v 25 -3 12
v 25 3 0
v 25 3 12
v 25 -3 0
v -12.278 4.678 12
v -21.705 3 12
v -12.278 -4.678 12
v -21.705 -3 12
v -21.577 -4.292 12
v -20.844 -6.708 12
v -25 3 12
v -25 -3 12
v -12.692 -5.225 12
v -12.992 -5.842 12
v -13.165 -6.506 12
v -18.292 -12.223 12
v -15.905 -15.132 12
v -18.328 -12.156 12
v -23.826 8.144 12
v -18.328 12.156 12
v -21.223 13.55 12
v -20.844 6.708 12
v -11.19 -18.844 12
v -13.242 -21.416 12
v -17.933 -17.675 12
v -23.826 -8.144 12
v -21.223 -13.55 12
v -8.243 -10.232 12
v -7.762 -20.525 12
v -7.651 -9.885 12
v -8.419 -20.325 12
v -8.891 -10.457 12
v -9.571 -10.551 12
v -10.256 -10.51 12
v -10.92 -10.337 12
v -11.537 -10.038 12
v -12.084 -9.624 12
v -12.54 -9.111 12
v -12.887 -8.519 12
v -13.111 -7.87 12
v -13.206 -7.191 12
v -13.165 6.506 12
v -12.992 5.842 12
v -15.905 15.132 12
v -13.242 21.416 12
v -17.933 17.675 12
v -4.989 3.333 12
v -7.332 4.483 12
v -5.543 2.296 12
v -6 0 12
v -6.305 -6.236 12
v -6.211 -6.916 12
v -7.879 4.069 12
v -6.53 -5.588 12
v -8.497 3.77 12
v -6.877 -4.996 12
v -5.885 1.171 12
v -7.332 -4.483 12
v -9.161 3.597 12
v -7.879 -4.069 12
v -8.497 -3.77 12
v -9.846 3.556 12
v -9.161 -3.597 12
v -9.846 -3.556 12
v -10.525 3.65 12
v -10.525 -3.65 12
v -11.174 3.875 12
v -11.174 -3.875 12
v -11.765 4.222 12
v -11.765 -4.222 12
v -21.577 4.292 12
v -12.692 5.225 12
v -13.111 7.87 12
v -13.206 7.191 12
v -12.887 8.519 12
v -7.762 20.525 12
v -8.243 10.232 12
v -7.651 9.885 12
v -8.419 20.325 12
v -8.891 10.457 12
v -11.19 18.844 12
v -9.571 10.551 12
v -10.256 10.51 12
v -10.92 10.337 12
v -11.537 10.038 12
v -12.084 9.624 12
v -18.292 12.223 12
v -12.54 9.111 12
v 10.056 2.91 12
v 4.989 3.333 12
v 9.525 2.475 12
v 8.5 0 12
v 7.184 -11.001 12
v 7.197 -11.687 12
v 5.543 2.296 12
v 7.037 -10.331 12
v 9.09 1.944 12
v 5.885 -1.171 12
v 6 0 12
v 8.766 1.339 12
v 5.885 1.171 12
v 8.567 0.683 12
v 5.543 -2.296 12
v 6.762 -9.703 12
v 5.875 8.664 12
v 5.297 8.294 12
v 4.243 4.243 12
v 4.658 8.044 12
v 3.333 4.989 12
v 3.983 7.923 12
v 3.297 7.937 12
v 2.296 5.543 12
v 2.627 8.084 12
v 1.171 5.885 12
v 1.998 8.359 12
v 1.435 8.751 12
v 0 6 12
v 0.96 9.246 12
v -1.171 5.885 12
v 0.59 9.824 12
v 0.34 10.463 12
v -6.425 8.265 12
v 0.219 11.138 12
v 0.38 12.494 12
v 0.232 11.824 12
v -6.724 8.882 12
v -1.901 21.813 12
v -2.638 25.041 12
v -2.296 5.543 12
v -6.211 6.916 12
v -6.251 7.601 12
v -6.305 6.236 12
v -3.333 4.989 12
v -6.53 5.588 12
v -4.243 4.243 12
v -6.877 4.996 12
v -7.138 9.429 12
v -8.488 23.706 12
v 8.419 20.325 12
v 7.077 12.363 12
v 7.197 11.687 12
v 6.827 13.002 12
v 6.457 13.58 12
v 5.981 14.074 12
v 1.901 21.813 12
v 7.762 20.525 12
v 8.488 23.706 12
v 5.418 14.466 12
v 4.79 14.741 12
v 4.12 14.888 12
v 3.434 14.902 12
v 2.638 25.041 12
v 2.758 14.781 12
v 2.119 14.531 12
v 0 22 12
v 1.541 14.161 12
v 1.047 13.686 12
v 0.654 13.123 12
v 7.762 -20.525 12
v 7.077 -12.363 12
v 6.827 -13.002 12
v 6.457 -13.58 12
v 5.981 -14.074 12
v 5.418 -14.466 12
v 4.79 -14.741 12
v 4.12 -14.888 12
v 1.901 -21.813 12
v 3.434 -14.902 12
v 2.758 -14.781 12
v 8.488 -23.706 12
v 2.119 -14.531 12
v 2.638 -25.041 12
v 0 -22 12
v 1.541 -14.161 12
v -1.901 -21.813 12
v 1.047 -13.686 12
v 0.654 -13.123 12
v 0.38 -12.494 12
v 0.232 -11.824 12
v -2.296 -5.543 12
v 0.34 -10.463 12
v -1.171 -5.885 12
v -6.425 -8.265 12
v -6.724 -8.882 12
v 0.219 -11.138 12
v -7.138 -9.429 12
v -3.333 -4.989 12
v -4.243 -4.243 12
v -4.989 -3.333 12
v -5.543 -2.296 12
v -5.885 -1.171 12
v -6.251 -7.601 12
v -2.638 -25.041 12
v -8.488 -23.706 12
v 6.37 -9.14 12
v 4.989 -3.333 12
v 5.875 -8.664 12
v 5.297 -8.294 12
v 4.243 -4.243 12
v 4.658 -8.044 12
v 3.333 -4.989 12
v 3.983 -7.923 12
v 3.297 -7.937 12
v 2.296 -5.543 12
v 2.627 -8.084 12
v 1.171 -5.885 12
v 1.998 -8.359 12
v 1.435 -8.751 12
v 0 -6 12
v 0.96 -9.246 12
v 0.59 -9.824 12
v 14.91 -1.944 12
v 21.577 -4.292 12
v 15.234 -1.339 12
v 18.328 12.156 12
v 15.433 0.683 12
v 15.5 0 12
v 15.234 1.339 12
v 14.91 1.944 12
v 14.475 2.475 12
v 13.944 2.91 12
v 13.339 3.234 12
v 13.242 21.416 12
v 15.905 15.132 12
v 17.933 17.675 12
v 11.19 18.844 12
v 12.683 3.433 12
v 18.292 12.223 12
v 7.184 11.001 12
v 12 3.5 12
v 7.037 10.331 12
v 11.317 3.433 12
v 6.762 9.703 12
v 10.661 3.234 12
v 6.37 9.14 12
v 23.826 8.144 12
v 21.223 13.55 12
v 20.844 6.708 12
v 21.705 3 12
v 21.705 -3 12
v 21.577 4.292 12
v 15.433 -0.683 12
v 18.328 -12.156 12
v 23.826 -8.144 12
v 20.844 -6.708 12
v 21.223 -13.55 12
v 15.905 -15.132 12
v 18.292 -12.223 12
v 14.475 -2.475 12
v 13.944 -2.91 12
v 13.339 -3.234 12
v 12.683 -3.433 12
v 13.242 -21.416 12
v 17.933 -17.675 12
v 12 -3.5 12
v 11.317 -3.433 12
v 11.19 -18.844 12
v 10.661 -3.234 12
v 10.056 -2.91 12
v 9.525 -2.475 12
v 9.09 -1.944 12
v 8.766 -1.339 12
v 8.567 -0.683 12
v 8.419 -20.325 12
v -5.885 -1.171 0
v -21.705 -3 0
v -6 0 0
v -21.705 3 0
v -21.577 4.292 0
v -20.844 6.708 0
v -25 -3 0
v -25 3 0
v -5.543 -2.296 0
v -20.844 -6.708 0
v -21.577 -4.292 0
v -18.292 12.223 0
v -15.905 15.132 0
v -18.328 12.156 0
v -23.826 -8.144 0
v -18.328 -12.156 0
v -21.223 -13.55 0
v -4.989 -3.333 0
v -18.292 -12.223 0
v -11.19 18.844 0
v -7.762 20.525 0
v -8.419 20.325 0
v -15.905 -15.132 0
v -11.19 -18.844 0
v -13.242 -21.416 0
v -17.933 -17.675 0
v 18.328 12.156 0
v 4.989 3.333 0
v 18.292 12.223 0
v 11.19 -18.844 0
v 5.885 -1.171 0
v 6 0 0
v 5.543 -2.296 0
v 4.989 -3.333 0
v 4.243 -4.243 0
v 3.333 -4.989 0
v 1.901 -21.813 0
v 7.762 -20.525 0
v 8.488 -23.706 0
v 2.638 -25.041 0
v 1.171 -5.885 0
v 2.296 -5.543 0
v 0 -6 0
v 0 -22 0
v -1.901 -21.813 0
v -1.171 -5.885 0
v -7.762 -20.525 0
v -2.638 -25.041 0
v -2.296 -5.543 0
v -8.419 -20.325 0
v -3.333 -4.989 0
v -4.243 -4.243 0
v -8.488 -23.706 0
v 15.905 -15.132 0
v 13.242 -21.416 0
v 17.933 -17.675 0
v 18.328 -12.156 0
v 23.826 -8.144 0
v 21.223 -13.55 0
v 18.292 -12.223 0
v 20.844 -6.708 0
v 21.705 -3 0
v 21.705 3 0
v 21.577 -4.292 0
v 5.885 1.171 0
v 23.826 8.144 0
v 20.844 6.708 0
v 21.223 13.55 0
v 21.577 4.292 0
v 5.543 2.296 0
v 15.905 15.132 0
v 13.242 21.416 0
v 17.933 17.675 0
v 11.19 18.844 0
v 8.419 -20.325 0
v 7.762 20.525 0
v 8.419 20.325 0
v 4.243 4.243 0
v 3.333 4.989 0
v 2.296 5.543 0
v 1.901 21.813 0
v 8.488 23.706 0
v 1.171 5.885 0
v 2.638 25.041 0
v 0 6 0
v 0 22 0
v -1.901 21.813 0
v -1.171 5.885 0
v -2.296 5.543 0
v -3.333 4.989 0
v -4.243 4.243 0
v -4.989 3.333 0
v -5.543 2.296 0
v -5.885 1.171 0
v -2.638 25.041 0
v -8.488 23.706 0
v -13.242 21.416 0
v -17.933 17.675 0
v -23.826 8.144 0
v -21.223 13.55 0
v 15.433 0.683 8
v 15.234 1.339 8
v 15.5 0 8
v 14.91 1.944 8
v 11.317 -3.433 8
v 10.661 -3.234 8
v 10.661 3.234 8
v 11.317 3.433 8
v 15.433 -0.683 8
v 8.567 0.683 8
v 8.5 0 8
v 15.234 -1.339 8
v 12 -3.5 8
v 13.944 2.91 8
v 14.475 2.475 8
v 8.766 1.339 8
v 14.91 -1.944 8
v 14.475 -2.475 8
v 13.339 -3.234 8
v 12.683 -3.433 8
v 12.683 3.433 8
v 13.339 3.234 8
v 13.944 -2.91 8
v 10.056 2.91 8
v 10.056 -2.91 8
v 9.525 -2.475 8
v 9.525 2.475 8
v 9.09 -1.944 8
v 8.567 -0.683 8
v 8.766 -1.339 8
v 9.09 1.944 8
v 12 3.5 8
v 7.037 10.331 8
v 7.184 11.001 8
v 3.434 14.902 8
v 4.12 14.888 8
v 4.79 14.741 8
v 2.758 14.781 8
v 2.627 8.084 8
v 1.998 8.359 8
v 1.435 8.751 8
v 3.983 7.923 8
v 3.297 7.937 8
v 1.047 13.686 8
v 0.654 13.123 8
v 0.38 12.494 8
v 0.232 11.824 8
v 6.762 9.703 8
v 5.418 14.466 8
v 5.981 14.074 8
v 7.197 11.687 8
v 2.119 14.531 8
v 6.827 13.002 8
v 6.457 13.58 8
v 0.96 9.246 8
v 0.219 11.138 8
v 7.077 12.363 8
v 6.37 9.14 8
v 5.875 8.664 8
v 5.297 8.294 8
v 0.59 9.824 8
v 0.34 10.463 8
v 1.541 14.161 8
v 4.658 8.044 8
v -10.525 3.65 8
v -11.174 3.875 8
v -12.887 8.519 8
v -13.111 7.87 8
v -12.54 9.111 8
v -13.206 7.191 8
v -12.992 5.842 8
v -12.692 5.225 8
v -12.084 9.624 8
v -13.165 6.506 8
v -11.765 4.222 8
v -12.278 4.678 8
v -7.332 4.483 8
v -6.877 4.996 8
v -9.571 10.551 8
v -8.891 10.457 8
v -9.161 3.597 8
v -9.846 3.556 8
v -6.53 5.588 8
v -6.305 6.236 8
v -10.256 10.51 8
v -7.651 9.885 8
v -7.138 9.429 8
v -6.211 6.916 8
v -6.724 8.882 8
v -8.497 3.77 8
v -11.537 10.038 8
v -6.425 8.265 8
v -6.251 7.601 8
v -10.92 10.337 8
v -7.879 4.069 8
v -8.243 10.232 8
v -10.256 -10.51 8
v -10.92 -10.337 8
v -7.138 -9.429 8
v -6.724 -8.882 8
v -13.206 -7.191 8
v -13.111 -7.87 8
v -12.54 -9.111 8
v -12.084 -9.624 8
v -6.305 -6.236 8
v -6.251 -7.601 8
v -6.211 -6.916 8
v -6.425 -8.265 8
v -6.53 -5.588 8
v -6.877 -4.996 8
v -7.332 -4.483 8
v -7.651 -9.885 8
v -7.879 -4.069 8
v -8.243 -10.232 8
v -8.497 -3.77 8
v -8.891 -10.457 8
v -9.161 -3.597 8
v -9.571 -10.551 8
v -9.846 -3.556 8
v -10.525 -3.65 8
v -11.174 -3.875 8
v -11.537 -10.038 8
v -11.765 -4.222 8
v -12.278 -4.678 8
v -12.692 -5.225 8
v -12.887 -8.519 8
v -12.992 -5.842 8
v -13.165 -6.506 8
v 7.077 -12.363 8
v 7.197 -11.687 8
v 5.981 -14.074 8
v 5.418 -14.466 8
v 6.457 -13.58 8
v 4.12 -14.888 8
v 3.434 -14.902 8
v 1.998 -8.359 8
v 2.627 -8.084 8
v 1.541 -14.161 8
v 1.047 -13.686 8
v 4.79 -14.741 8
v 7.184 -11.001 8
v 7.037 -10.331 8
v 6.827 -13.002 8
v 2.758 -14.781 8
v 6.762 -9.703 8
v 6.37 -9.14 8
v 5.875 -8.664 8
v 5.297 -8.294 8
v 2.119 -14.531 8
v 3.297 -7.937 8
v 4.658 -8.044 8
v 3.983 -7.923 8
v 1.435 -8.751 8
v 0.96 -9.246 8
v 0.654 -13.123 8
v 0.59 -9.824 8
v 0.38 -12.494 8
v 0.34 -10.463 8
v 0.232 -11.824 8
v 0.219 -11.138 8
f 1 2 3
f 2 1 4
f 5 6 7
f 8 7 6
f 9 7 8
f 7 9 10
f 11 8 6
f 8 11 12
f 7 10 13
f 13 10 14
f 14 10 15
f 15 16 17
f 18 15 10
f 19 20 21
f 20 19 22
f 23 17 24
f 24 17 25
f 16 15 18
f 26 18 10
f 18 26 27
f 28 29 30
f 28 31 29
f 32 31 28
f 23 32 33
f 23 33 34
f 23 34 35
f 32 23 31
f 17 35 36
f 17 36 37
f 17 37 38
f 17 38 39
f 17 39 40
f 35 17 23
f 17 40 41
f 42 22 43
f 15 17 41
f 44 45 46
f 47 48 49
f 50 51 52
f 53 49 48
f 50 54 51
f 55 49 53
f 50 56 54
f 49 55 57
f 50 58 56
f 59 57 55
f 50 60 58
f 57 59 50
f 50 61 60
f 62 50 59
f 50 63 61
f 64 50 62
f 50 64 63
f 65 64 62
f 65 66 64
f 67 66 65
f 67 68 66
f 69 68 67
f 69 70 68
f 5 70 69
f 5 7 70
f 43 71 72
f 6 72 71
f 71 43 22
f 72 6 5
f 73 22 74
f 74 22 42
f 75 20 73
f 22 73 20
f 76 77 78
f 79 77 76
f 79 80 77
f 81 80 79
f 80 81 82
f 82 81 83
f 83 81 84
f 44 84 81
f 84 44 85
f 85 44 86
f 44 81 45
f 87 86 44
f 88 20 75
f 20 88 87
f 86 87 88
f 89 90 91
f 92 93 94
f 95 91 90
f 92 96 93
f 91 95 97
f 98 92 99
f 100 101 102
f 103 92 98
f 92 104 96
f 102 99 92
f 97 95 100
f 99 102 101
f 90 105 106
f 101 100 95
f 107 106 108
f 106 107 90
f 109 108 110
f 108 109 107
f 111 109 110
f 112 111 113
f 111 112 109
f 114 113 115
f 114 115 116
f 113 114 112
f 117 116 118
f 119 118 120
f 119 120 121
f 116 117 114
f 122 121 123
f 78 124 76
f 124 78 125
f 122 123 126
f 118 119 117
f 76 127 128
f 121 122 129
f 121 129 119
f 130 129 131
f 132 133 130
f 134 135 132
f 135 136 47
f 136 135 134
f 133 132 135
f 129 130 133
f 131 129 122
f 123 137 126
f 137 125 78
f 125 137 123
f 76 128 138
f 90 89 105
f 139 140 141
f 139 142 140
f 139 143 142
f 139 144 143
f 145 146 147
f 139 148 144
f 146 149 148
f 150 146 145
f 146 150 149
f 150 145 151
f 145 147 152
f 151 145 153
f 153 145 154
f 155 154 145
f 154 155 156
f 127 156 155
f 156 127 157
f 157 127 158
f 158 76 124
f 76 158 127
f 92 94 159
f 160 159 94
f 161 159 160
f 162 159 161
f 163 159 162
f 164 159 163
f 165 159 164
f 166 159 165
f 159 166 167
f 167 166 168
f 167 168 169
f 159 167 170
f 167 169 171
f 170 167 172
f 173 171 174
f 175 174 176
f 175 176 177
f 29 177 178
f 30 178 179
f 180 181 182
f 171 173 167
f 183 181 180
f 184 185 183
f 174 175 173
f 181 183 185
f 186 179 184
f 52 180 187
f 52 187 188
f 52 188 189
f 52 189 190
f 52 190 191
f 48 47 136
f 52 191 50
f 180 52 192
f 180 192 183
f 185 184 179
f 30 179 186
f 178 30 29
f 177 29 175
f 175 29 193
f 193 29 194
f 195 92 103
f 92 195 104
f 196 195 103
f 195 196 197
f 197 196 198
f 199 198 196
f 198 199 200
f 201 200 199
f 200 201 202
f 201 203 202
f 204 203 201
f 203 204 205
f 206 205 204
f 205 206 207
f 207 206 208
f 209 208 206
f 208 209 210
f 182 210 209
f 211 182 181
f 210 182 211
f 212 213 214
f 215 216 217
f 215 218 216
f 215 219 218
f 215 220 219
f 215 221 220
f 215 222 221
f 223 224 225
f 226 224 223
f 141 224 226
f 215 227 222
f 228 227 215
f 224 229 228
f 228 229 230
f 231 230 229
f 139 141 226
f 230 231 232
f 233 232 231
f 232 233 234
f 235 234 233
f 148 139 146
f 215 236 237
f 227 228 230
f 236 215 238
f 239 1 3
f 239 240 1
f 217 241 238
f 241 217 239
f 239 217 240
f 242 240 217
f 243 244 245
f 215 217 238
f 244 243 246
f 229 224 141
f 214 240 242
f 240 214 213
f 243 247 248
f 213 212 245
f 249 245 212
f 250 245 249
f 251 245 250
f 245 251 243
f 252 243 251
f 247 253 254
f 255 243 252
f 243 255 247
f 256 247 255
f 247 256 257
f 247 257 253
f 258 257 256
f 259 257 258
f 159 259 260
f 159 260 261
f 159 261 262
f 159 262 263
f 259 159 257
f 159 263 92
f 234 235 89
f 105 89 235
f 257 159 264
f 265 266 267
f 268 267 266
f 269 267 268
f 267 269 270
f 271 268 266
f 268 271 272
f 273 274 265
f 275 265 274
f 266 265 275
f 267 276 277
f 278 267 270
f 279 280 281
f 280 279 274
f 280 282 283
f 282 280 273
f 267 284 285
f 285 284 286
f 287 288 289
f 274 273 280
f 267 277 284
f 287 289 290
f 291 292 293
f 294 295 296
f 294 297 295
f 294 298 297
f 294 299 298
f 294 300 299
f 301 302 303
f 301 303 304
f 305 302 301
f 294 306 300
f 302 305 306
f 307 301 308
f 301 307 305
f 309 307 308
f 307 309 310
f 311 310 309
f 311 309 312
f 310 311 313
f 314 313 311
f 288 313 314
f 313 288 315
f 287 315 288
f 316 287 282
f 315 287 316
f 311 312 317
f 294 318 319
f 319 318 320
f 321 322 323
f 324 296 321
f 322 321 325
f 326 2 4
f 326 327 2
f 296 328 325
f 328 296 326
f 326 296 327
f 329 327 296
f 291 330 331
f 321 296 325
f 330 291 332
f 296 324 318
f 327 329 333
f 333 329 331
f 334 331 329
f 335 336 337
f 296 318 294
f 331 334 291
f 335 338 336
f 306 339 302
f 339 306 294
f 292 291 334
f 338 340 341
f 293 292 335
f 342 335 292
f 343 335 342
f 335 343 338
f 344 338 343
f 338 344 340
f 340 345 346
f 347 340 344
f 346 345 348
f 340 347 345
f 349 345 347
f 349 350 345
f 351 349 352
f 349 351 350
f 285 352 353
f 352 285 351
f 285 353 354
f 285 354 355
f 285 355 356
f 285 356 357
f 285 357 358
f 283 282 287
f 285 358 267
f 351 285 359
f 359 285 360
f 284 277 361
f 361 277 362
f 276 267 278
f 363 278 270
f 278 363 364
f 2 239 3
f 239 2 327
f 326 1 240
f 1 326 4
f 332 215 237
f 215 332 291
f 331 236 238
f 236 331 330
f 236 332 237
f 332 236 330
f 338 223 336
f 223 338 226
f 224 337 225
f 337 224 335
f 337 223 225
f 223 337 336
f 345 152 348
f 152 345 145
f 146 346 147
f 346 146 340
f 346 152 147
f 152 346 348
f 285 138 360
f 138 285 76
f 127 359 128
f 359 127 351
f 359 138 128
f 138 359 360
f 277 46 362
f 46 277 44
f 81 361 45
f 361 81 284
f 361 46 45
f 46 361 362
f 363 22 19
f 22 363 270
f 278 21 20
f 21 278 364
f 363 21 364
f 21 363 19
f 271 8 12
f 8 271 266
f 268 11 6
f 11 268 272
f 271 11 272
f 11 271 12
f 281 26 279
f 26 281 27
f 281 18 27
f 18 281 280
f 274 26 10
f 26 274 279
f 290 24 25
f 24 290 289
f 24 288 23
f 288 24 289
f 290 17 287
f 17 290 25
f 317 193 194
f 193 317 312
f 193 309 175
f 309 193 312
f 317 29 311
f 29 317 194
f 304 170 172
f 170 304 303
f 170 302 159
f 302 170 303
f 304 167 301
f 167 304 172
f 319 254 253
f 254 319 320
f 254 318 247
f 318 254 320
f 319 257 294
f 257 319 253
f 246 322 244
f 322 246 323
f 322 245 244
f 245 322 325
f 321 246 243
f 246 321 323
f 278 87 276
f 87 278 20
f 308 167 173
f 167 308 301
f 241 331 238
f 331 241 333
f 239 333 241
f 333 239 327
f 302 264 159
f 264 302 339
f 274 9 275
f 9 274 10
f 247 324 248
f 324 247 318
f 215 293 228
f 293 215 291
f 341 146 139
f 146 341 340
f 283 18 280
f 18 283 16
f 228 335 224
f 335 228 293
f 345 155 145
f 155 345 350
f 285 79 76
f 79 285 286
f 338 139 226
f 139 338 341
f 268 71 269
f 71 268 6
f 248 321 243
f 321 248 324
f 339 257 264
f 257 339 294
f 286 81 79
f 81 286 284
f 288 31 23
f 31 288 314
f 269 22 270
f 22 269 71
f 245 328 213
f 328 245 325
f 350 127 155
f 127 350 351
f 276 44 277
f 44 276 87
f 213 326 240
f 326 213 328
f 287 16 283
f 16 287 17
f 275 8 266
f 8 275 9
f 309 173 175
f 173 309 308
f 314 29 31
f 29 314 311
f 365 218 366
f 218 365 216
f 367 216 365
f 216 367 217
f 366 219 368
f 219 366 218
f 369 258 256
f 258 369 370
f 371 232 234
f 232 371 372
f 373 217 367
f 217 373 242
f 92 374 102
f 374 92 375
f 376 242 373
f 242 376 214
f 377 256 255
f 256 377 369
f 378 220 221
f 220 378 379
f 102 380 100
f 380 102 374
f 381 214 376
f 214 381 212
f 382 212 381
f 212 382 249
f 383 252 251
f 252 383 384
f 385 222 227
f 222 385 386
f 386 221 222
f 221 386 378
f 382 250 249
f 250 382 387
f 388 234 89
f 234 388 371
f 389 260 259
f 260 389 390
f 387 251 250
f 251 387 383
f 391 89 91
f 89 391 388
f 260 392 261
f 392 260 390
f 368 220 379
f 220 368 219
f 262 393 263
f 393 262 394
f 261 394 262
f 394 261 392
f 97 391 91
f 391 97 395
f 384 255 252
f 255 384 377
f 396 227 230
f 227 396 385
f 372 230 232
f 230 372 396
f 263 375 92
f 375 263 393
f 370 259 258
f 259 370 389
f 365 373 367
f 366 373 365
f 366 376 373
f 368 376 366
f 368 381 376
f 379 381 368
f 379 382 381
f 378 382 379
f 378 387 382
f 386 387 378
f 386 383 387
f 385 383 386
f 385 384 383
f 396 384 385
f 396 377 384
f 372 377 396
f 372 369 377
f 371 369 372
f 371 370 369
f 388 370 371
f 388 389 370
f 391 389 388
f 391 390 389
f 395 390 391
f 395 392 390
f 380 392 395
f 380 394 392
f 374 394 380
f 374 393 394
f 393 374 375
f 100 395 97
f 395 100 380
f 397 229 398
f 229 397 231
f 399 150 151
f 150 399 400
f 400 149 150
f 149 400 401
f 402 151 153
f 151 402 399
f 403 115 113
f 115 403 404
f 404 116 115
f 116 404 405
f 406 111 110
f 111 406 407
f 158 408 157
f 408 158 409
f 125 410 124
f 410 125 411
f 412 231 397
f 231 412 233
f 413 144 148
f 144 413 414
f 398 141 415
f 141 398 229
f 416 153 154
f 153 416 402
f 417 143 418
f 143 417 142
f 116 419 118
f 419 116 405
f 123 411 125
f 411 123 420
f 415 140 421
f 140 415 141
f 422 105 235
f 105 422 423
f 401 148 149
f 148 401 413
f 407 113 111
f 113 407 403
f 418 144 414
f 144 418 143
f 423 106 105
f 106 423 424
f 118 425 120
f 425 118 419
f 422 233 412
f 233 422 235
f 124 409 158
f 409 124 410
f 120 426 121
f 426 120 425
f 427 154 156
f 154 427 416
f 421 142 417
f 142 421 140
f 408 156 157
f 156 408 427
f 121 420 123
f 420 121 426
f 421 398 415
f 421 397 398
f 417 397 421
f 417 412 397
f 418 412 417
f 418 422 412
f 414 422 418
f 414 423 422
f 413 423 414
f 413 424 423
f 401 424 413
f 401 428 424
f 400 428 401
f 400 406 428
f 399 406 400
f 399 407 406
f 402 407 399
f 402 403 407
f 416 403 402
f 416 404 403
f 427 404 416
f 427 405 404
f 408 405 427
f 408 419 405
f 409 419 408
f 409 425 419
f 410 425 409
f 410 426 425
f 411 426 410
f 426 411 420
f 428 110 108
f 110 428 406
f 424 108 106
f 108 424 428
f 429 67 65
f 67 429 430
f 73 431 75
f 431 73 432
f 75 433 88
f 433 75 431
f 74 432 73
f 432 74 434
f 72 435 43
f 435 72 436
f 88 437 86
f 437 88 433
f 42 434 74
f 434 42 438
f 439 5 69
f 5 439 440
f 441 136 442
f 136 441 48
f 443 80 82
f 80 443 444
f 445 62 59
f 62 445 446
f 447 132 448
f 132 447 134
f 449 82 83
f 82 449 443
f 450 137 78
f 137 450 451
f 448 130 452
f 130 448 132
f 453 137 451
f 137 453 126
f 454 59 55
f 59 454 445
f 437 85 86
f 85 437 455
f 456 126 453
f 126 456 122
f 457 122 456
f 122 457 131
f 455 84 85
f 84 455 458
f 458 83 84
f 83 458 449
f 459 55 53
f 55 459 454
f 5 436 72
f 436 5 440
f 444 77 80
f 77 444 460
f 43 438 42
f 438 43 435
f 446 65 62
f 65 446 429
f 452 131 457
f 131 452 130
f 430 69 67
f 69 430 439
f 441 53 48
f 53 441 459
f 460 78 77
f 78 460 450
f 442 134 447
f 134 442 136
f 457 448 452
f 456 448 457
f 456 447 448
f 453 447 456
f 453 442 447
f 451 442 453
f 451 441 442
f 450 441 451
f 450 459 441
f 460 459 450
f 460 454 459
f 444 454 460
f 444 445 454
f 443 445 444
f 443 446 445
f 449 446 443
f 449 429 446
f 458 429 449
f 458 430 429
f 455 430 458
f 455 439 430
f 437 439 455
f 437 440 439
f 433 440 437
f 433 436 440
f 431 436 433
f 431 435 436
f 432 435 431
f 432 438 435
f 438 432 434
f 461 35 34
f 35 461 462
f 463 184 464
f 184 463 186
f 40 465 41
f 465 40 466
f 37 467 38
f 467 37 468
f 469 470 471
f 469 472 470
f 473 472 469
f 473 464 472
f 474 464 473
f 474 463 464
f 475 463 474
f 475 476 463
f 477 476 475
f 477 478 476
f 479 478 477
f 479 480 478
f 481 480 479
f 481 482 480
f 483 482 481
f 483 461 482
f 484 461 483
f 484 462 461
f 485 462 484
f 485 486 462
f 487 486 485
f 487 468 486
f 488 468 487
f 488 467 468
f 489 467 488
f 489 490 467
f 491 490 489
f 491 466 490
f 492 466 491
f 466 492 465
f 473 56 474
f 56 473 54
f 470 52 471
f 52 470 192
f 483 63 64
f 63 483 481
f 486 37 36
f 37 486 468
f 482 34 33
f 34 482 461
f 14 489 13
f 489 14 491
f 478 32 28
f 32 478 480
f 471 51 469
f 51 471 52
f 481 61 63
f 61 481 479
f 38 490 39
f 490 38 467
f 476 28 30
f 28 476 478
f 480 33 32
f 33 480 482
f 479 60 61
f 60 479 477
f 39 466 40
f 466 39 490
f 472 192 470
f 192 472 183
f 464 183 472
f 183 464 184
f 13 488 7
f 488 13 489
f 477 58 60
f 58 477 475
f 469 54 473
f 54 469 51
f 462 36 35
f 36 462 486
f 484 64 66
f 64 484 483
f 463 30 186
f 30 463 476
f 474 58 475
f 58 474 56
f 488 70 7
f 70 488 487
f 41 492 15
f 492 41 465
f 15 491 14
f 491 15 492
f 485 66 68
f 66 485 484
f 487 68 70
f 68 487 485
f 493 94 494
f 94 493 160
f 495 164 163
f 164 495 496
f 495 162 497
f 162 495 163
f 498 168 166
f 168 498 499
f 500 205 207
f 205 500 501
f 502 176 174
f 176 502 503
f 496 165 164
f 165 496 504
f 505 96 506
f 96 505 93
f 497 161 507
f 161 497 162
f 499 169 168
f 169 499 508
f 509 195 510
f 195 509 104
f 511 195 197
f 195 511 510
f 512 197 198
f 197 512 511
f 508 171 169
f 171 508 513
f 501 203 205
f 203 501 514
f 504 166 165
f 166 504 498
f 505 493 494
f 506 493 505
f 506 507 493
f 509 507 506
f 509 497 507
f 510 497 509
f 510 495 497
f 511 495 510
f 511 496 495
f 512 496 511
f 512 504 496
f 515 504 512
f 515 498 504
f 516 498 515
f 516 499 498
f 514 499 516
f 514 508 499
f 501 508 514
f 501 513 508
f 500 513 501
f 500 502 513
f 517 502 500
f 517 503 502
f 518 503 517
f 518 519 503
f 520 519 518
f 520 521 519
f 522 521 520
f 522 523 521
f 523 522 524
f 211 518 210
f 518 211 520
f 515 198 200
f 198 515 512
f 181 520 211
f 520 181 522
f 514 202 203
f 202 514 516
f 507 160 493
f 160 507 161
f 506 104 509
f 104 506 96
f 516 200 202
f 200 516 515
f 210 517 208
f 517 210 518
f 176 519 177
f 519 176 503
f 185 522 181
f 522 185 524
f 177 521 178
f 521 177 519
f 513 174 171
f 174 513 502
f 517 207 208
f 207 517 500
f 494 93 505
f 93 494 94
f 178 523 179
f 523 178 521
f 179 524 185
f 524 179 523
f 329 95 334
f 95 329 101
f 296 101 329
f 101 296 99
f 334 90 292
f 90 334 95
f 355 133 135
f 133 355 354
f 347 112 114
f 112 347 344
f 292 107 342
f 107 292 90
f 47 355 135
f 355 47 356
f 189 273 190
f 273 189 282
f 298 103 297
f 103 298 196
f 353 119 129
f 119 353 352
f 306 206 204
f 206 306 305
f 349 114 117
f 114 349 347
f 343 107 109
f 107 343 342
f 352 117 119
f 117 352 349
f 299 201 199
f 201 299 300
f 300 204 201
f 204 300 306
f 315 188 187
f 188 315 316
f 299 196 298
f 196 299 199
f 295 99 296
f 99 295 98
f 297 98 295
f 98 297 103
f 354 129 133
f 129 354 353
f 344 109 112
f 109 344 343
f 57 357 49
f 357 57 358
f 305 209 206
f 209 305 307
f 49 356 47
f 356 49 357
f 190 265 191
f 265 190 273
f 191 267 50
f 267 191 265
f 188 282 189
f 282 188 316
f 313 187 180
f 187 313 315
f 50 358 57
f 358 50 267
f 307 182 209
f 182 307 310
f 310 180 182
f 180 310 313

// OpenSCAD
$fn = 32;

// ----------------------------------------------------------------------
// Spur blank: lightened gear blank
// ----------------------------------------------------------------------

// --- parameters (mm) ---
disc_r = 22;              // blank root radius
disc_t = 12;              // blank thickness
n_teeth = 14;             // stub tooth count
tooth_w = 6;              // tooth width at the root
tooth_h = 3;              // tooth height above the root
bore_r = 6;               // central bore radius
ring_r = 12;              // lightening pocket ring radius
pocket_r = 3.5;           // lightening pocket radius

out_r = disc_r + tooth_h;  // tip radius
bbox_x = 50.0;  // measured width over the teeth
bbox_y = 50.08;  // measured depth over the teeth

difference() {
union() {
  cylinder(r = disc_r, h = disc_t);
  for (i = [0 : n_teeth - 1])
    rotate([0, 0, i * 360 / n_teeth])
      translate([disc_r - 1, -tooth_w / 2, 0])
        cube([tooth_h + 1, tooth_w, disc_t]);
}
  translate([0, 0, -1]) cylinder(r = bore_r, h = disc_t + 2);
  for (i = [0 : 5])
    rotate([0, 0, i * 72])
      translate([ring_r, 0, disc_t - 4])
        cylinder(r = pocket_r, h = 5);
}
